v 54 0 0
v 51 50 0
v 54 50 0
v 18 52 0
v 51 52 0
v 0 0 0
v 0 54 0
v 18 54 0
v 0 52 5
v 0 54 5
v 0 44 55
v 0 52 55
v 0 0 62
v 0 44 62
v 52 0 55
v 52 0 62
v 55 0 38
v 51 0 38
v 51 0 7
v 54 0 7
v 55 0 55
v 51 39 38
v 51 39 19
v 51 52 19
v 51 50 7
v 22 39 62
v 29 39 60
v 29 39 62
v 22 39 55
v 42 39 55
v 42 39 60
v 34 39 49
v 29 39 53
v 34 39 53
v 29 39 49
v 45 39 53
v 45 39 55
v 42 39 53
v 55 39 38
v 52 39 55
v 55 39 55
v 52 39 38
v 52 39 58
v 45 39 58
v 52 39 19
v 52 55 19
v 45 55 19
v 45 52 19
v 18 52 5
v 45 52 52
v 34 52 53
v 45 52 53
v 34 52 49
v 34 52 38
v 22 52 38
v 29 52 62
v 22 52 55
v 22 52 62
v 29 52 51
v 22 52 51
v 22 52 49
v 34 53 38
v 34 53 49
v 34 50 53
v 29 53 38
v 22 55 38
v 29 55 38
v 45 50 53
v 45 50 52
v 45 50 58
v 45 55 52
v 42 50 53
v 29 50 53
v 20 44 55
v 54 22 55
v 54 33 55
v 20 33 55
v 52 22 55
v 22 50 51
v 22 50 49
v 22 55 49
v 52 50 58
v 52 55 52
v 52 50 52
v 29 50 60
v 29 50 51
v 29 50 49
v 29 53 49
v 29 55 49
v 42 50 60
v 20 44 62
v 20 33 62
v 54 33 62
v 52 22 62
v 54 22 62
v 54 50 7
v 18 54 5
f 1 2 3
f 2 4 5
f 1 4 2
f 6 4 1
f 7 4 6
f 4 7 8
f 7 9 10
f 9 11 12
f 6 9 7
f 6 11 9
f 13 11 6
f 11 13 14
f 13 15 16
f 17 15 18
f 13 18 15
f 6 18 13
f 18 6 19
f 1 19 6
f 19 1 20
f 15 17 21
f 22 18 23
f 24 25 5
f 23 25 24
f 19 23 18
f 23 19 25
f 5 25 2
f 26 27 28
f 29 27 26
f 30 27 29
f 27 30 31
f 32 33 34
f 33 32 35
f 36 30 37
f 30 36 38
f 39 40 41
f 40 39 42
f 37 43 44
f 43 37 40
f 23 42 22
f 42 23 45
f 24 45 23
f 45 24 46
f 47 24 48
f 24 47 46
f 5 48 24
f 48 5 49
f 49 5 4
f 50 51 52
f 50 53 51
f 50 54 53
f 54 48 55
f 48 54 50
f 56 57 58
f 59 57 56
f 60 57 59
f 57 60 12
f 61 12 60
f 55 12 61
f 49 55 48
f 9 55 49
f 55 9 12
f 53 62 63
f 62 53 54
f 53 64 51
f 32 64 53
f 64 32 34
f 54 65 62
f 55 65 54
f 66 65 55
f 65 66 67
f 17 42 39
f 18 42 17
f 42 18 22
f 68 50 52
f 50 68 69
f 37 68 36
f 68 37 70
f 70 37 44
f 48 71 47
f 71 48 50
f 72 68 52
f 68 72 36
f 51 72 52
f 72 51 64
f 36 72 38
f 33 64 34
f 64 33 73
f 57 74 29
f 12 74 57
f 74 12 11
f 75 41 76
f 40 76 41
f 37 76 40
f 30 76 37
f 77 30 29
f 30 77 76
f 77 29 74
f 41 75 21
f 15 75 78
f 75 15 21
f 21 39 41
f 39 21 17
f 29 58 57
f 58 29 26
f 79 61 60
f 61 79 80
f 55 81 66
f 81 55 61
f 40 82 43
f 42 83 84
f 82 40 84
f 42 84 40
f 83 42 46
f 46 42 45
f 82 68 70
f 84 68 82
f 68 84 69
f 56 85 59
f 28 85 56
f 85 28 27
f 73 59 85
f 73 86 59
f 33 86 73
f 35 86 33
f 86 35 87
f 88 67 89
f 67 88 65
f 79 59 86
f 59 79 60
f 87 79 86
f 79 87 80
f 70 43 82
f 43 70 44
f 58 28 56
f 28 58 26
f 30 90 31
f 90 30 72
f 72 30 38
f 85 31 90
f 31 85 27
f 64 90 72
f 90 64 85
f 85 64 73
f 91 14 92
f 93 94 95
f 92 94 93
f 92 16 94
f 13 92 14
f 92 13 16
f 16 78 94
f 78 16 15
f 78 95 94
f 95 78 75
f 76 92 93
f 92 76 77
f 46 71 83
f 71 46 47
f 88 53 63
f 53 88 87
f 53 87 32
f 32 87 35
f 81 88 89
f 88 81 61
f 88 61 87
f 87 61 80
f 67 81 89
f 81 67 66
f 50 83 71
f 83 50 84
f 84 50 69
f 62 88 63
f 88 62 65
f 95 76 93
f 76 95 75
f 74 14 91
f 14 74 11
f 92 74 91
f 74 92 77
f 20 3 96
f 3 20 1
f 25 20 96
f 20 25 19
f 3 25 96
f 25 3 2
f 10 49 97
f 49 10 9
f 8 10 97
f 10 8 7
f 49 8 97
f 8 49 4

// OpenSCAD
translate([8.5, 6.5, 9.5]) color([0.18259927432055334, 0.12509989752770068, 0.33788945440902196]) cube([17, 13, 19], center=true);
translate([25.5, 6.5, 9.5]) color([0.607477949510089, 0.04413950751599882, 0.6453929548117466]) cube([17, 13, 19], center=true);
translate([42.5, 6.5, 9.5]) color([0.6988419541065013, 0.7967664255910738, 0.9116718921976609]) cube([17, 13, 19], center=true);
translate([8.5, 19.5, 9.5]) color([0.600448770579328, 0.7944487907838055, 0.1681613799771936]) cube([17, 13, 19], center=true);
translate([25.5, 19.5, 9.5]) color([0.9183995562433641, 0.9268586566852167, 0.40822611044352053]) cube([17, 13, 19], center=true);
translate([42.5, 19.5, 9.5]) color([0.4407066729290805, 0.6041418306666712, 0.6201352905963935]) cube([17, 13, 19], center=true);
translate([8.5, 32.5, 9.5]) color([0.25582819932935885, 0.3097428572381714, 0.8490920052212889]) cube([17, 13, 19], center=true);
translate([25.5, 32.5, 9.5]) color([0.453637908490201, 0.18066627555108494, 0.4537290543496928]) cube([17, 13, 19], center=true);
translate([42.5, 32.5, 9.5]) color([0.2641493990309046, 0.9492851375614021, 0.06409274308092405]) cube([17, 13, 19], center=true);
translate([8.5, 45.5, 9.5]) color([0.09630522223834415, 0.02618666999626429, 0.02133712304448243]) cube([17, 13, 19], center=true);
translate([25.5, 45.5, 9.5]) color([0.40376331371079255, 0.6905719463038024, 0.8969992176715027]) cube([17, 13, 19], center=true);
translate([42.5, 45.5, 9.5]) color([0.32280326974746465, 0.790755737975632, 0.7460115169857665]) cube([17, 13, 19], center=true);
translate([8.5, 6.5, 28.5]) color([0.6948475129606672, 0.47653257906772517, 0.8579766307154586]) cube([17, 13, 19], center=true);
translate([25.5, 6.5, 28.5]) color([0.5356136848189613, 0.4019331618452773, 0.783713898498177]) cube([17, 13, 19], center=true);
translate([42.5, 6.5, 28.5]) color([0.9254696984756191, 0.0277966234683793, 0.5158650286176655]) cube([17, 13, 19], center=true);
translate([8.5, 19.5, 28.5]) color([0.8365998776746773, 0.08009244005093674, 0.35854963179787425]) cube([17, 13, 19], center=true);
translate([25.5, 19.5, 28.5]) color([0.0984859129144442, 0.9681463616569913, 0.1542718478221884]) cube([17, 13, 19], center=true);
translate([42.5, 19.5, 28.5]) color([0.5165971564168642, 0.8047430089643692, 0.9598305824160865]) cube([17, 13, 19], center=true);
translate([8.5, 32.5, 28.5]) color([0.0007265089205383823, 0.33769105491683293, 0.9444140087685011]) cube([17, 13, 19], center=true);
translate([25.5, 32.5, 28.5]) color([0.6959768172121321, 0.16055826227824588, 0.7793255516951493]) cube([17, 13, 19], center=true);
translate([42.5, 32.5, 28.5]) color([0.1589752259859445, 0.6798370424105331, 0.9431536263145228]) cube([17, 13, 19], center=true);
translate([8.5, 45.5, 28.5]) color([0.9341404857092784, 0.32827049453258017, 0.023848105094706917]) cube([17, 13, 19], center=true);
translate([25.5, 45.5, 28.5]) color([0.9585798448912861, 0.6258377632382796, 0.3981042954636257]) cube([17, 13, 19], center=true);
translate([39.5, 45.5, 27.5]) color([0.2264255750200933, 0.6356717667101055, 0.328569085672622]) cube([11, 13, 17], center=true);
translate([39.5, 45.5, 44.5]) color([0.9662245753272395, 0.3520821722301851, 0.16362135021644642]) cube([11, 13, 17], center=true);
translate([5.5, 6.5, 46.5]) color([0.42074777530803376, 0.36328644213461747, 0.5653807754665455]) cube([11, 13, 17], center=true);
translate([16.5, 6.5, 46.5]) color([0.3865100485452896, 0.7707594112565195, 0.16214085318372695]) cube([11, 13, 17], center=true);
translate([27.5, 6.5, 46.5]) color([0.5836514905515098, 0.6869400768720183, 0.718467099976435]) cube([11, 13, 17], center=true);
translate([38.5, 6.5, 46.5]) color([0.17196229100139104, 0.14887881293527583, 0.025166107893626943]) cube([11, 13, 17], center=true);
translate([49.5, 6.5, 46.5]) color([0.32332346968418324, 0.003696799562737496, 0.04720529747843194]) cube([11, 13, 17], center=true);
translate([5.5, 19.5, 46.5]) color([0.9255571895234466, 0.573001262631075, 0.14769469781462263]) cube([11, 13, 17], center=true);
translate([16.5, 19.5, 46.5]) color([0.15315209085934545, 0.7868491215994531, 0.7877029182496789]) cube([11, 13, 17], center=true);
translate([27.5, 19.5, 46.5]) color([0.4187372508366701, 0.5680438273675328, 0.6864311496386182]) cube([11, 13, 17], center=true);
translate([38.5, 19.5, 46.5]) color([0.7112052310106062, 0.9225367392437966, 0.36402675889620517]) cube([11, 13, 17], center=true);
translate([49.5, 19.5, 46.5]) color([0.21666285047939615, 0.40038769746607716, 0.12979762559949215]) cube([11, 13, 17], center=true);
translate([5.5, 32.5, 46.5]) color([0.5661089096865166, 0.350592866287013, 0.09655676358596321]) cube([11, 13, 17], center=true);
translate([16.5, 32.5, 46.5]) color([0.8957043173613797, 0.24564542972396286, 0.3817592950540295]) cube([11, 13, 17], center=true);
translate([27.5, 32.5, 46.5]) color([0.9163373365613642, 0.24005472395766314, 0.4811830401201487]) cube([11, 13, 17], center=true);
translate([38.5, 32.5, 46.5]) color([0.9204180358452778, 0.06901768472479497, 0.25236871091997304]) cube([11, 13, 17], center=true);
translate([49.5, 32.5, 46.5]) color([0.2758752397078251, 0.526585946767007, 0.5423400552699501]) cube([11, 13, 17], center=true);
translate([5.5, 45.5, 46.5]) color([0.6040332809955223, 0.7795947303962014, 0.8767515811101877]) cube([11, 13, 17], center=true);
translate([16.5, 45.5, 46.5]) color([0.27628184885013174, 0.6109665581700968, 0.8673330381368943]) cube([11, 13, 17], center=true);
translate([48.5, 44.5, 25.5]) color([0.39077563557117434, 0.6261021875341246, 0.5344719952169016]) cube([7, 11, 13], center=true);
translate([48.5, 44.5, 38.5]) color([0.8525626141482417, 0.1442072370162294, 0.39242938925918713]) cube([7, 11, 13], center=true);
translate([25.5, 44.5, 44.5]) color([0.7677442686337953, 0.7310024639236243, 0.976490023680837]) cube([7, 11, 13], center=true);
translate([48.5, 44.5, 51.5]) color([0.432956620488795, 0.10481875176128097, 0.4606863677813431]) cube([7, 11, 13], center=true);
translate([25.5, 45.5, 56.5]) color([0.461987586031698, 0.16960878923904732, 0.4743590683571708]) cube([7, 13, 11], center=true);
translate([35.5, 44.5, 56.5]) color([0.15900931947085895, 0.9184122383299332, 0.8645912802495788]) cube([13, 11, 7], center=true);
translate([6.5, 5.5, 58.5]) color([0.7618309073415613, 0.1125156501937501, 0.36828247715101237]) cube([13, 11, 7], center=true);
translate([19.5, 5.5, 58.5]) color([0.14269334546182144, 0.3576212954978014, 0.47267833076618404]) cube([13, 11, 7], center=true);
translate([32.5, 5.5, 58.5]) color([0.5187172796832821, 0.05390524264941354, 0.8771386739413267]) cube([13, 11, 7], center=true);
translate([45.5, 5.5, 58.5]) color([0.25763233882857706, 0.7234564765071956, 0.3246711887124375]) cube([13, 11, 7], center=true);
translate([6.5, 16.5, 58.5]) color([0.3801134723009394, 0.04146251299314507, 0.5514350789130729]) cube([13, 11, 7], center=true);
translate([19.5, 16.5, 58.5]) color([0.03490092368589748, 0.4105469306488987, 0.3751623833766272]) cube([13, 11, 7], center=true);
translate([32.5, 16.5, 58.5]) color([0.20817480494735885, 0.13416269520041413, 0.11029894361740877]) cube([13, 11, 7], center=true);
translate([45.5, 16.5, 58.5]) color([0.3569637027811857, 0.03122581862343432, 0.5766961902260587]) cube([13, 11, 7], center=true);
translate([6.5, 27.5, 58.5]) color([0.46351932045943167, 0.6418946885374921, 0.7070356211127606]) cube([13, 11, 7], center=true);
translate([19.5, 27.5, 58.5]) color([0.07782501561786981, 0.42542790282452947, 0.7262099352025745]) cube([13, 11, 7], center=true);
translate([32.5, 27.5, 58.5]) color([0.1383007479401901, 0.15296819960671582, 0.16447153857536234]) cube([13, 11, 7], center=true);
translate([48.5, 52.5, 24.5]) color([0.02972250823157674, 0.13555611535148748, 0.49304209170471214]) cube([7, 5, 11], center=true);
translate([48.5, 52.5, 35.5]) color([0.8998582652350663, 0.6233506257524957, 0.28803948846792526]) cube([7, 5, 11], center=true);
translate([25.5, 52.5, 43.5]) color([0.7932252536354372, 0.6841926136499455, 0.8025617596714979]) cube([7, 5, 11], center=true);
translate([48.5, 52.5, 46.5]) color([0.9141286153689818, 0.8380916000073253, 0.7734206085146829]) cube([7, 5, 11], center=true);
translate([31.5, 42.5, 43.5]) color([0.26176851167691584, 0.15831969188506612, 0.6279762350139132]) cube([5, 7, 11], center=true);
translate([31.5, 49.5, 43.5]) color([0.968532274155243, 0.5331314108905011, 0.14458049768334114]) cube([5, 7, 11], center=true);
translate([41.5, 27.5, 58.5]) color([0.3761389701406963, 0.7397992144806613, 0.5554788507911738]) cube([5, 11, 7], center=true);
translate([46.5, 27.5, 58.5]) color([0.2345364606417215, 0.9148239194796951, 0.37856658806298793]) cube([5, 11, 7], center=true);
translate([51.5, 27.5, 58.5]) color([0.39026506951982043, 0.4712732695903361, 0.3061585200178283]) cube([5, 11, 7], center=true);
translate([2.5, 38.5, 58.5]) color([0.41010119017851343, 0.4062986061941243, 0.09771277519641097]) cube([5, 11, 7], center=true);
translate([7.5, 38.5, 58.5]) color([0.9732189413459187, 0.1476462111243403, 0.5834920525213394]) cube([5, 11, 7], center=true);
translate([12.5, 38.5, 58.5]) color([0.6340513654385499, 0.981030210372344, 0.8814881035470955]) cube([5, 11, 7], center=true);
translate([17.5, 38.5, 58.5]) color([0.10681393516694448, 0.7792822990369496, 0.6980706766614326]) cube([5, 11, 7], center=true);
translate([52.5, 2.5, 3.5]) color([0.5957858833990998, 0.6031315697857828, 0.513452068799622]) cube([3, 5, 7], center=true);
translate([52.5, 7.5, 3.5]) color([0.26667928463625334, 0.7319196359388911, 0.16863726359497544]) cube([3, 5, 7], center=true);
translate([52.5, 12.5, 3.5]) color([0.08537701363375594, 0.03602107622091366, 0.11539851048895433]) cube([3, 5, 7], center=true);
translate([52.5, 17.5, 3.5]) color([0.362166522572666, 0.7224633804016175, 0.31835367611154275]) cube([3, 5, 7], center=true);
translate([52.5, 22.5, 3.5]) color([0.6759746033894163, 0.3690945326108701, 0.6966804657420774]) cube([3, 5, 7], center=true);
translate([52.5, 27.5, 3.5]) color([0.6665423027167577, 0.8120877428034601, 0.22871566506275376]) cube([3, 5, 7], center=true);
translate([52.5, 32.5, 3.5]) color([0.1590470788005368, 0.551630898022963, 0.8946771329487354]) cube([3, 5, 7], center=true);
translate([52.5, 37.5, 3.5]) color([0.7805199910429719, 0.5079920956553113, 0.8859418345093829]) cube([3, 5, 7], center=true);
translate([52.5, 42.5, 3.5]) color([0.025781518425698202, 0.6432115126368863, 0.16681516080095515]) cube([3, 5, 7], center=true);
translate([52.5, 47.5, 3.5]) color([0.9937350713993572, 0.40890136814306854, 0.6606487125760558]) cube([3, 5, 7], center=true);
translate([1.5, 53.0, 2.5]) color([0.4381854363391663, 0.6836690634862878, 0.2641275750187716]) cube([3, 2, 5], center=true);
translate([4.5, 53.0, 2.5]) color([0.5874382639994257, 0.9196592523769888, 0.17133498851343842]) cube([3, 2, 5], center=true);
translate([7.5, 53.0, 2.5]) color([0.44096269879447136, 0.05365288940263557, 0.37504810787352794]) cube([3, 2, 5], center=true);
translate([10.5, 53.0, 2.5]) color([0.8023437119036539, 0.6440571739391641, 0.405188264955044]) cube([3, 2, 5], center=true);
translate([13.5, 53.0, 2.5]) color([0.23309555282291106, 0.8734163899386287, 0.03910603731828377]) cube([3, 2, 5], center=true);
translate([16.5, 53.0, 2.5]) color([0.6200029336050585, 0.26869184399515444, 0.5075002274683115]) cube([3, 2, 5], center=true);
